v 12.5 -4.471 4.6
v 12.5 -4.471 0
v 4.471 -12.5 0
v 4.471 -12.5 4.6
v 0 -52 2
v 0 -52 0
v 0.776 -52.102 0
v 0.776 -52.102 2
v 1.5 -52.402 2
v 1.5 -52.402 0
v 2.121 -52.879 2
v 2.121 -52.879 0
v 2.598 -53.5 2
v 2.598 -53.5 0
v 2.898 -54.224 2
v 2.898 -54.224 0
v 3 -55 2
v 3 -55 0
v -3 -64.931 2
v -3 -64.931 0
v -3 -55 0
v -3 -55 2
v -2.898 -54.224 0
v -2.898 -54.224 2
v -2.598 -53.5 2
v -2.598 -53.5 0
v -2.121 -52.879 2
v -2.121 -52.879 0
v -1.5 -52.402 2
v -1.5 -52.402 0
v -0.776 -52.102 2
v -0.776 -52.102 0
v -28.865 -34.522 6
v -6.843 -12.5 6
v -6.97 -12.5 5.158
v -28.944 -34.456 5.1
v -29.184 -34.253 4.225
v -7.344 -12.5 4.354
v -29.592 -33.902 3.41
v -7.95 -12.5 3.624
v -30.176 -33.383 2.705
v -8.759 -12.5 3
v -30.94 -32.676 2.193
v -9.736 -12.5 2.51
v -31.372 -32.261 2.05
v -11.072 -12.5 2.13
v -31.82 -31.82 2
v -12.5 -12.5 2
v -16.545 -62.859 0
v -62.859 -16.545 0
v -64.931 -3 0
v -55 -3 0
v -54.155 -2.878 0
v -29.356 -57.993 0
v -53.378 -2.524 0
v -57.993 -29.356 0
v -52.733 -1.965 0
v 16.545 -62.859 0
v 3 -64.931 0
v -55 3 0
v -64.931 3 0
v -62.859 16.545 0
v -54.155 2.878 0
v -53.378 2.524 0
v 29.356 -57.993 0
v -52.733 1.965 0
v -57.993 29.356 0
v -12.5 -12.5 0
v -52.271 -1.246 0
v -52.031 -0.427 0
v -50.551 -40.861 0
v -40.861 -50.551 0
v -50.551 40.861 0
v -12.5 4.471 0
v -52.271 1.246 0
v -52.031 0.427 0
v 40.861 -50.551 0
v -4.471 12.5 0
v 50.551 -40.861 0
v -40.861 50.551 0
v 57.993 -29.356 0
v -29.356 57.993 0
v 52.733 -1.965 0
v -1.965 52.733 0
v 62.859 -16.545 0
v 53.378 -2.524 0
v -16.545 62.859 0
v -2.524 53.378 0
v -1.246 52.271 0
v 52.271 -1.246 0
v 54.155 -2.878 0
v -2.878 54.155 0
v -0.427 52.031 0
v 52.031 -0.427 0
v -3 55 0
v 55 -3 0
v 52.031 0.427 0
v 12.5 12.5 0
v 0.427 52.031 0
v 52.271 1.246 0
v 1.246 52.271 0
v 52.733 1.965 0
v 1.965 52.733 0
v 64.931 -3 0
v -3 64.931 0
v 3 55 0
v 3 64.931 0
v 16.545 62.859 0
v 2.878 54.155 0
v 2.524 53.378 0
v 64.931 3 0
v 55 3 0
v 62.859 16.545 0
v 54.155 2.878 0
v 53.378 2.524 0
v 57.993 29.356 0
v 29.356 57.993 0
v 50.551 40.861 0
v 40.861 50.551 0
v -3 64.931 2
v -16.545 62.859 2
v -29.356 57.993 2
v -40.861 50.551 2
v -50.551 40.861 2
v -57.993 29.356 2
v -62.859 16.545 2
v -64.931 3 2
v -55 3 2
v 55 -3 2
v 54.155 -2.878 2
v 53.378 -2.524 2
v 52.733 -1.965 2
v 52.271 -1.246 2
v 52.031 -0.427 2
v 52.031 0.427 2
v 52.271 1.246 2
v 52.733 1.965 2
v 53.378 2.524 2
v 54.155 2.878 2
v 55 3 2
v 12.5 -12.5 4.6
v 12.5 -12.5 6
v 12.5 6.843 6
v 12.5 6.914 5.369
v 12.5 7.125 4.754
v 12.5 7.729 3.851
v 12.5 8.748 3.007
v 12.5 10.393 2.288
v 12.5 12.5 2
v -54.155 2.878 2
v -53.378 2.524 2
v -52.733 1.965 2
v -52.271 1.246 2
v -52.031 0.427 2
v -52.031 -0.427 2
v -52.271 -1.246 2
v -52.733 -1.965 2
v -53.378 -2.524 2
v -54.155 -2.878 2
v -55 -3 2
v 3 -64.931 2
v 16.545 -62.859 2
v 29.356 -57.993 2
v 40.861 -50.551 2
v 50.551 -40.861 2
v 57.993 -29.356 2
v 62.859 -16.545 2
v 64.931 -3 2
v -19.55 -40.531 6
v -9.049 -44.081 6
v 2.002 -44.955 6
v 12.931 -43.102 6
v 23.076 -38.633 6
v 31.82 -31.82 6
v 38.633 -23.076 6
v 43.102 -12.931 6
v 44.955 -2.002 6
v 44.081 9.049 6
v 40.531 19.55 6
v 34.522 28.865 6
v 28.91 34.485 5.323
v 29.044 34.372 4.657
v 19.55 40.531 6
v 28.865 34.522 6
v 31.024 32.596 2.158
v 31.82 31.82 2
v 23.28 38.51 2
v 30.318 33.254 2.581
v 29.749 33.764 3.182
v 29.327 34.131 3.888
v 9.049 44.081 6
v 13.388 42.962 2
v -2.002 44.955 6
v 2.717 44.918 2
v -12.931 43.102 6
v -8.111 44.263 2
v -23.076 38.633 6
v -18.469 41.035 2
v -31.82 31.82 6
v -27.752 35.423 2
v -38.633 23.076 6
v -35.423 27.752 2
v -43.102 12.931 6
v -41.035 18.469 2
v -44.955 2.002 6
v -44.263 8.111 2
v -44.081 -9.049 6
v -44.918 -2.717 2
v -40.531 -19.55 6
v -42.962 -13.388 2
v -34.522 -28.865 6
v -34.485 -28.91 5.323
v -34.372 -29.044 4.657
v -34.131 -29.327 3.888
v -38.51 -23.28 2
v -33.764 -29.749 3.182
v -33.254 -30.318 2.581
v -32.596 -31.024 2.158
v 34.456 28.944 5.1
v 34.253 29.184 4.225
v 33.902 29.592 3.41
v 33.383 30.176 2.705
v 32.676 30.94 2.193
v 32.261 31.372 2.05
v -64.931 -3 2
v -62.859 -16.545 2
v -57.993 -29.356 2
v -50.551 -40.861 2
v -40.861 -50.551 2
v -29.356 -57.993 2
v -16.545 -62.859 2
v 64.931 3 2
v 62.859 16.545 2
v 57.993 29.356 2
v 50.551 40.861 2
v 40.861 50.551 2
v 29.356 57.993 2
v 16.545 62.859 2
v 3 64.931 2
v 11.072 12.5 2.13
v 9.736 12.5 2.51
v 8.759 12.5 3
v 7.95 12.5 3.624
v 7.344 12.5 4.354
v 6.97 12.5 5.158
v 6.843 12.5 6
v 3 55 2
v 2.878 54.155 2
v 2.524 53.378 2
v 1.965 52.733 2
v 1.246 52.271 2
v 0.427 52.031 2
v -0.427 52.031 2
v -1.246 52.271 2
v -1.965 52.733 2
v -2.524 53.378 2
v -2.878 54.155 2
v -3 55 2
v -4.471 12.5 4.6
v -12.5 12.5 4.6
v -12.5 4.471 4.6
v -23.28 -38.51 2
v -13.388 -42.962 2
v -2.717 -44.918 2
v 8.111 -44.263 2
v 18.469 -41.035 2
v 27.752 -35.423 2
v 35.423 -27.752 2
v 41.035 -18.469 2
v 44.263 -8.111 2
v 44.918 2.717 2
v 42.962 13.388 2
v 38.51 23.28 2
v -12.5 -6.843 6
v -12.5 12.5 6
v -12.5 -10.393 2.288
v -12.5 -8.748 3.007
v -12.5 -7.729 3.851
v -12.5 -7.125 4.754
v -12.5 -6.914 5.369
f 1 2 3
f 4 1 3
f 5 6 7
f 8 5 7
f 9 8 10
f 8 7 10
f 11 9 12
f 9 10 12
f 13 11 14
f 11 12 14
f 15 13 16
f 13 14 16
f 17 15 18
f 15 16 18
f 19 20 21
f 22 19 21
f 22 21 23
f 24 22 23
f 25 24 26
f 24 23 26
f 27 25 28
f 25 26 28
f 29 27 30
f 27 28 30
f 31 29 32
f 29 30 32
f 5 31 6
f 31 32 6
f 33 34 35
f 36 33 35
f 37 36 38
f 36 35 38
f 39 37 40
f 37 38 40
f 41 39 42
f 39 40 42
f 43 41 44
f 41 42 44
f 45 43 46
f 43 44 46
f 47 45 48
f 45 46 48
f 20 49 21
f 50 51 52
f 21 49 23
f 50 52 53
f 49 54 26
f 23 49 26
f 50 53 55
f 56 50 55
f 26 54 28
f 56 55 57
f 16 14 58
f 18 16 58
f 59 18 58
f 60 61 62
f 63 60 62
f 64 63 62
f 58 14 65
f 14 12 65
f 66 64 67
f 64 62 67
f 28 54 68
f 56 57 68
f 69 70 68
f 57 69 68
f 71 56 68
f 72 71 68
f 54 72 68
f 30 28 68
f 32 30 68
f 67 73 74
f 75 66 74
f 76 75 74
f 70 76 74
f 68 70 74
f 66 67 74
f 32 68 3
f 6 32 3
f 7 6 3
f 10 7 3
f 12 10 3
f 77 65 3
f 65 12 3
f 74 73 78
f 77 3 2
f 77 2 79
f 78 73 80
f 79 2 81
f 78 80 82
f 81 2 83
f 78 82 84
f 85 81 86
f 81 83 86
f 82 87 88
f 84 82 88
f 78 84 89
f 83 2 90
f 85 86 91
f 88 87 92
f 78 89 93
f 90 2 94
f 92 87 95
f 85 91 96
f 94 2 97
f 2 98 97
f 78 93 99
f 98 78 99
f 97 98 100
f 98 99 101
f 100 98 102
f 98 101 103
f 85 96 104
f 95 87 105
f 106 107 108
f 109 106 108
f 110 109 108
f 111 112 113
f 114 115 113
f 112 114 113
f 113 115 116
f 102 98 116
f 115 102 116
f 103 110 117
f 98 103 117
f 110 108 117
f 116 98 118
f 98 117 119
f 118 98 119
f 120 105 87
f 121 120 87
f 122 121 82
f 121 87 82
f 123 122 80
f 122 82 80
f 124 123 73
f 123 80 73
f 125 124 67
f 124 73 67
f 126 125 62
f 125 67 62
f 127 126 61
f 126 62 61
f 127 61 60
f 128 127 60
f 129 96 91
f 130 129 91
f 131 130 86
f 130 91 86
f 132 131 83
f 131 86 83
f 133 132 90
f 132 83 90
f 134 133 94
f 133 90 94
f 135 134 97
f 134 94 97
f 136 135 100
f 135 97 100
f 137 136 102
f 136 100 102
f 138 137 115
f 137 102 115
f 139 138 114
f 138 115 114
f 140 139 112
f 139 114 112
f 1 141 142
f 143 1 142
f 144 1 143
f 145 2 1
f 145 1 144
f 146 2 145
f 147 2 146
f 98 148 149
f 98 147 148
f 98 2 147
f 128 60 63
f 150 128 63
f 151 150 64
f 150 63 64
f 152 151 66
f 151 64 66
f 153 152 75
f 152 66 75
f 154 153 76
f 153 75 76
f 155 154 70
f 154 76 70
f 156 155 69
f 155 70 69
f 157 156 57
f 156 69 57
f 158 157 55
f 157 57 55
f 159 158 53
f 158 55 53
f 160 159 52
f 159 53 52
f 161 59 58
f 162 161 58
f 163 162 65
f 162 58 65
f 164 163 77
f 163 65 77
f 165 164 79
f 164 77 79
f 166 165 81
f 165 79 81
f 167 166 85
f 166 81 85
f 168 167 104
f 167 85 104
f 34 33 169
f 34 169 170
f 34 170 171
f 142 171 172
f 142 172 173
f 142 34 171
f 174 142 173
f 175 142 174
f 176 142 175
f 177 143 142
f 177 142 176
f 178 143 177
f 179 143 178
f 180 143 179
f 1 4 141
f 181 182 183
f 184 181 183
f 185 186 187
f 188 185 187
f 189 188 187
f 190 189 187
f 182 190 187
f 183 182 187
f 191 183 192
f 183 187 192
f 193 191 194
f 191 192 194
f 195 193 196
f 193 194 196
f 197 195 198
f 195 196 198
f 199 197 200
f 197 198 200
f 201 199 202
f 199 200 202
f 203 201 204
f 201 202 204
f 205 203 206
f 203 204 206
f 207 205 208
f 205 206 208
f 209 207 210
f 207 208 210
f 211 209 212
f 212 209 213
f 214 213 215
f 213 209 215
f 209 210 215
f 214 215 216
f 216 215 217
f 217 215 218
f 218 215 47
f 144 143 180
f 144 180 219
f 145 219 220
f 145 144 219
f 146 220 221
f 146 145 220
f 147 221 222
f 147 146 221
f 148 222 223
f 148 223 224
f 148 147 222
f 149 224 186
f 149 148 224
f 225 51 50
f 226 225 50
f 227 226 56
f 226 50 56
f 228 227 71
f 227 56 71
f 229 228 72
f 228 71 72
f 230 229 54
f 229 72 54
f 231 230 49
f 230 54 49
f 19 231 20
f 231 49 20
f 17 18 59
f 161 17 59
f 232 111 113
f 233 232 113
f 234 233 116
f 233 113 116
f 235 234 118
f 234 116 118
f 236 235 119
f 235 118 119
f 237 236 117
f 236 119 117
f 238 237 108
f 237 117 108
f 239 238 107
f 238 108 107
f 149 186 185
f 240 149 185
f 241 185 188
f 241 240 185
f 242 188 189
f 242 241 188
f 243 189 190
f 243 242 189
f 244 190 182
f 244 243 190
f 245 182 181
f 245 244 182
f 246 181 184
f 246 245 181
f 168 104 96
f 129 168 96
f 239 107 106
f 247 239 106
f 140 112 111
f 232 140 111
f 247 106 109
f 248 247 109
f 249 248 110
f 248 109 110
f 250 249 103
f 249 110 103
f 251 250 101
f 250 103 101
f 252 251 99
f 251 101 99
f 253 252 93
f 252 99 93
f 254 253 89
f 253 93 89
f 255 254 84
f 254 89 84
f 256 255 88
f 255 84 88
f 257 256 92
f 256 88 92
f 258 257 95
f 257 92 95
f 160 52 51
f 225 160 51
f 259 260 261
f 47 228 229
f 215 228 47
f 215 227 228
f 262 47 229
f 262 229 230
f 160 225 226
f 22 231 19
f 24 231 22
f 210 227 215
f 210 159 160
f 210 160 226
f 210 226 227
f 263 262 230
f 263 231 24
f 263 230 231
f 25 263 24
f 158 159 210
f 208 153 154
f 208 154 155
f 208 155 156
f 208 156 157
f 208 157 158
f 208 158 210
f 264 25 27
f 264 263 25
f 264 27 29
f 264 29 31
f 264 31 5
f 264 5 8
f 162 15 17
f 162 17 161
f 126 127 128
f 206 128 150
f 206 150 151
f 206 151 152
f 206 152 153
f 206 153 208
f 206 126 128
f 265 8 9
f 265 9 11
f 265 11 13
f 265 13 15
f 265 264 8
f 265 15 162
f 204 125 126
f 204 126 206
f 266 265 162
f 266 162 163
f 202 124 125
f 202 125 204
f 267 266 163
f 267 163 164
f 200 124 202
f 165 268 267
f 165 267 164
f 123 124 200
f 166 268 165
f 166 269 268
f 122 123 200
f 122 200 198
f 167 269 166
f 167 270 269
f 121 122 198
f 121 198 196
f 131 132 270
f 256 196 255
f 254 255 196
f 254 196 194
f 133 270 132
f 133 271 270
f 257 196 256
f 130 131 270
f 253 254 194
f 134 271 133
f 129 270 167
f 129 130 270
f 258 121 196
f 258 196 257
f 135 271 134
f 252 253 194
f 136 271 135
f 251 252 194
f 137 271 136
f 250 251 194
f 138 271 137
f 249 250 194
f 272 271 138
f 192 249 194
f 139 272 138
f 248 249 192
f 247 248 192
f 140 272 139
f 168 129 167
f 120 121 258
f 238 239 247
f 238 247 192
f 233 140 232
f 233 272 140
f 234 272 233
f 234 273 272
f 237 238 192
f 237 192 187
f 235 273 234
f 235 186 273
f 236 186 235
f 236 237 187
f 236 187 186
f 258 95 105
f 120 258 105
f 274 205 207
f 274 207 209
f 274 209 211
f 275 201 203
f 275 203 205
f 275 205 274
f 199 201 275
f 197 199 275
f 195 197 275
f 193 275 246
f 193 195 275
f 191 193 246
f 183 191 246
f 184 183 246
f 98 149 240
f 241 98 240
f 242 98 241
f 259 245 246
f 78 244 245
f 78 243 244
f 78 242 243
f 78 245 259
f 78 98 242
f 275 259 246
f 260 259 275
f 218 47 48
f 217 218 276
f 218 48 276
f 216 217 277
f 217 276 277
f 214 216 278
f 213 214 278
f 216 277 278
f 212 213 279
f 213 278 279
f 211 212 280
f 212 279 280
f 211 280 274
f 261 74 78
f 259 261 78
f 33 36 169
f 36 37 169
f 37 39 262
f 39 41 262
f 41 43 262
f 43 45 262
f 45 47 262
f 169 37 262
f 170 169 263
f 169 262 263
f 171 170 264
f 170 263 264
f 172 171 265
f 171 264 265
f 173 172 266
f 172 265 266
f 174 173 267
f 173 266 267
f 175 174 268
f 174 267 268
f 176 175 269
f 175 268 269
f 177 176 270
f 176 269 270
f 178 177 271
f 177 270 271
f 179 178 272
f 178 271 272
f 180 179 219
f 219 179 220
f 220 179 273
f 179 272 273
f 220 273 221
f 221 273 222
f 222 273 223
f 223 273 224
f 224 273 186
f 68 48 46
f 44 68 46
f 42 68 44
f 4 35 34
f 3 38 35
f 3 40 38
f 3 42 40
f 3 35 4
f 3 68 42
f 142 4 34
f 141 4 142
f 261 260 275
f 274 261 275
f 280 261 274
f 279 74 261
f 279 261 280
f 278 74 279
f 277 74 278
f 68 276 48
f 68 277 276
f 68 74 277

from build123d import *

# Parameters (mm, degrees)
F2_DEPTH      = 2
F3_DEPTH      = 6
F4_DEPTH      = 6
F5_DEPTH      = 4.6
F9_DEPTH      = 45
F9_DEPTH_BACK = 45


with BuildPart() as f2:
    # F0 (on Top) → F2 (new body)
    with BuildSketch(Plane.XY):
        with BuildLine():
            Line((55, 3), (64.930732323, 3))
            ThreePointArc((64.930732323, 3), (45.9619407771, 45.9619407771), (3, 64.930732323))
            Line((3, 64.930732323), (3, 55))
            ThreePointArc((3, 55), (0, 52), (-3, 55))
            Line((-3, 55), (-3, 64.930732323))
            ThreePointArc((-3, 64.930732323), (-45.9619407771, 45.9619407771), (-64.930732323, 3))
            Line((-64.930732323, 3), (-55, 3))
            ThreePointArc((-55, 3), (-52, 0), (-55, -3))
            Line((-55, -3), (-64.930732323, -3))
            ThreePointArc((-64.930732323, -3), (-45.9619407771, -45.9619407771), (-3, -64.930732323))
            Line((-3, -64.930732323), (-3, -55))
            ThreePointArc((-3, -55), (-2.1213203436, -52.8786796564), (0, -52))
            ThreePointArc((0, -52), (2.1213203436, -52.8786796564), (3, -55))
            Line((3, -55), (3, -64.930732323))
            ThreePointArc((3, -64.930732323), (45.9619407771, -45.9619407771), (64.930732323, -3))
            Line((64.930732323, -3), (55, -3))
            ThreePointArc((55, -3), (52, 0), (55, 3))
        make_face()
        with BuildLine():
            ThreePointArc((45, 0), (31.8198051534, -31.8198051534), (0, -45))
            ThreePointArc((0, -45), (-31.8198051534, 31.8198051534), (45, 0))
        make_face(mode=Mode.SUBTRACT)
    extrude(amount=F2_DEPTH)

    # F0 (on Top) → F3 (join)
    with BuildSketch(Plane.XY):
        with BuildLine():
            ThreePointArc((45, 0), (-31.8198051534, 31.8198051534), (0, -45))
            ThreePointArc((0, -45), (31.8198051534, -31.8198051534), (45, 0))
        make_face()
    extrude(amount=F3_DEPTH)

    # F1 (on Top) → F4 (cut)
    with BuildSketch(Plane.XY):
        Polygon((4.4705627485, -12.5), (12.5, -12.5), (12.5, -4.4705627485), align=None)
        with BuildLine():
            Line((-12.5, -12.5), (4.4705627485, -12.5))
            Line((4.4705627485, -12.5), (12.5, -4.4705627485))
            Line((12.5, -4.4705627485), (12.5, 12.5))
            Line((12.5, 12.5), (7.4246212025, 7.4246212025))
            ThreePointArc((7.4246212025, 7.4246212025), (9.7007350914, 4.0181760398), (10.5, 0))
            ThreePointArc((10.5, 0), (4.0181760398, -9.7007350914), (-7.4246212025, -7.4246212025))
            Line((-7.4246212025, -7.4246212025), (-12.5, -12.5))
        make_face()
        with BuildLine():
            Line((-12.5, 4.4705627485), (-12.5, -12.5))
            Line((-12.5, -12.5), (-7.4246212025, -7.4246212025))
            ThreePointArc((-7.4246212025, -7.4246212025), (-7.4246212025, 7.4246212025), (7.4246212025, 7.4246212025))
            Line((7.4246212025, 7.4246212025), (12.5, 12.5))
            Line((12.5, 12.5), (-4.4705627485, 12.5))
            Line((-4.4705627485, 12.5), (-12.5, 4.4705627485))
        make_face()
        Polygon((-12.5, 12.5), (-12.5, 4.4705627485), (-4.4705627485, 12.5), align=None)
        with BuildLine():
            Line((7.4246212025, 7.4246212025), (-7.4246212025, -7.4246212025))
            ThreePointArc((-7.4246212025, -7.4246212025), (4.0181760398, -9.7007350914), (10.5, 0))
            ThreePointArc((10.5, 0), (9.7007350914, 4.0181760398), (7.4246212025, 7.4246212025))
        make_face()
        with BuildLine():
            ThreePointArc((7.4246212025, 7.4246212025), (-7.4246212025, 7.4246212025), (-7.4246212025, -7.4246212025))
            Line((-7.4246212025, -7.4246212025), (7.4246212025, 7.4246212025))
        make_face()
    extrude(amount=F4_DEPTH, mode=Mode.SUBTRACT)

    # F1 (on Top) → F5 (join)
    with BuildSketch(Plane.XY):
        Polygon((-12.5, 12.5), (-12.5, 4.4705627485), (-4.4705627485, 12.5), align=None)
        Polygon((4.4705627485, -12.5), (12.5, -12.5), (12.5, -4.4705627485), align=None)
    extrude(amount=F5_DEPTH)

    # F8 (on line) → F9 (cut, two sides)
    with BuildSketch(Plane(origin=(0, 0, 0), x_dir=(-0.7071067812, 0.7071067812, 0), z_dir=(0.7071067812, 0.7071067812, 0))) as f9_sk:
        with BuildLine():
            ThreePointArc((0, 2), (2.8284271247, 3.1715728753), (4, 6))
            ThreePointArc((4, 6), (-2.8284271247, 8.8284271247), (0, 2))
        make_face()
    extrude(amount=-F9_DEPTH, mode=Mode.SUBTRACT)
    extrude(f9_sk.sketch, amount=F9_DEPTH_BACK, mode=Mode.SUBTRACT)


solid = f2.part
